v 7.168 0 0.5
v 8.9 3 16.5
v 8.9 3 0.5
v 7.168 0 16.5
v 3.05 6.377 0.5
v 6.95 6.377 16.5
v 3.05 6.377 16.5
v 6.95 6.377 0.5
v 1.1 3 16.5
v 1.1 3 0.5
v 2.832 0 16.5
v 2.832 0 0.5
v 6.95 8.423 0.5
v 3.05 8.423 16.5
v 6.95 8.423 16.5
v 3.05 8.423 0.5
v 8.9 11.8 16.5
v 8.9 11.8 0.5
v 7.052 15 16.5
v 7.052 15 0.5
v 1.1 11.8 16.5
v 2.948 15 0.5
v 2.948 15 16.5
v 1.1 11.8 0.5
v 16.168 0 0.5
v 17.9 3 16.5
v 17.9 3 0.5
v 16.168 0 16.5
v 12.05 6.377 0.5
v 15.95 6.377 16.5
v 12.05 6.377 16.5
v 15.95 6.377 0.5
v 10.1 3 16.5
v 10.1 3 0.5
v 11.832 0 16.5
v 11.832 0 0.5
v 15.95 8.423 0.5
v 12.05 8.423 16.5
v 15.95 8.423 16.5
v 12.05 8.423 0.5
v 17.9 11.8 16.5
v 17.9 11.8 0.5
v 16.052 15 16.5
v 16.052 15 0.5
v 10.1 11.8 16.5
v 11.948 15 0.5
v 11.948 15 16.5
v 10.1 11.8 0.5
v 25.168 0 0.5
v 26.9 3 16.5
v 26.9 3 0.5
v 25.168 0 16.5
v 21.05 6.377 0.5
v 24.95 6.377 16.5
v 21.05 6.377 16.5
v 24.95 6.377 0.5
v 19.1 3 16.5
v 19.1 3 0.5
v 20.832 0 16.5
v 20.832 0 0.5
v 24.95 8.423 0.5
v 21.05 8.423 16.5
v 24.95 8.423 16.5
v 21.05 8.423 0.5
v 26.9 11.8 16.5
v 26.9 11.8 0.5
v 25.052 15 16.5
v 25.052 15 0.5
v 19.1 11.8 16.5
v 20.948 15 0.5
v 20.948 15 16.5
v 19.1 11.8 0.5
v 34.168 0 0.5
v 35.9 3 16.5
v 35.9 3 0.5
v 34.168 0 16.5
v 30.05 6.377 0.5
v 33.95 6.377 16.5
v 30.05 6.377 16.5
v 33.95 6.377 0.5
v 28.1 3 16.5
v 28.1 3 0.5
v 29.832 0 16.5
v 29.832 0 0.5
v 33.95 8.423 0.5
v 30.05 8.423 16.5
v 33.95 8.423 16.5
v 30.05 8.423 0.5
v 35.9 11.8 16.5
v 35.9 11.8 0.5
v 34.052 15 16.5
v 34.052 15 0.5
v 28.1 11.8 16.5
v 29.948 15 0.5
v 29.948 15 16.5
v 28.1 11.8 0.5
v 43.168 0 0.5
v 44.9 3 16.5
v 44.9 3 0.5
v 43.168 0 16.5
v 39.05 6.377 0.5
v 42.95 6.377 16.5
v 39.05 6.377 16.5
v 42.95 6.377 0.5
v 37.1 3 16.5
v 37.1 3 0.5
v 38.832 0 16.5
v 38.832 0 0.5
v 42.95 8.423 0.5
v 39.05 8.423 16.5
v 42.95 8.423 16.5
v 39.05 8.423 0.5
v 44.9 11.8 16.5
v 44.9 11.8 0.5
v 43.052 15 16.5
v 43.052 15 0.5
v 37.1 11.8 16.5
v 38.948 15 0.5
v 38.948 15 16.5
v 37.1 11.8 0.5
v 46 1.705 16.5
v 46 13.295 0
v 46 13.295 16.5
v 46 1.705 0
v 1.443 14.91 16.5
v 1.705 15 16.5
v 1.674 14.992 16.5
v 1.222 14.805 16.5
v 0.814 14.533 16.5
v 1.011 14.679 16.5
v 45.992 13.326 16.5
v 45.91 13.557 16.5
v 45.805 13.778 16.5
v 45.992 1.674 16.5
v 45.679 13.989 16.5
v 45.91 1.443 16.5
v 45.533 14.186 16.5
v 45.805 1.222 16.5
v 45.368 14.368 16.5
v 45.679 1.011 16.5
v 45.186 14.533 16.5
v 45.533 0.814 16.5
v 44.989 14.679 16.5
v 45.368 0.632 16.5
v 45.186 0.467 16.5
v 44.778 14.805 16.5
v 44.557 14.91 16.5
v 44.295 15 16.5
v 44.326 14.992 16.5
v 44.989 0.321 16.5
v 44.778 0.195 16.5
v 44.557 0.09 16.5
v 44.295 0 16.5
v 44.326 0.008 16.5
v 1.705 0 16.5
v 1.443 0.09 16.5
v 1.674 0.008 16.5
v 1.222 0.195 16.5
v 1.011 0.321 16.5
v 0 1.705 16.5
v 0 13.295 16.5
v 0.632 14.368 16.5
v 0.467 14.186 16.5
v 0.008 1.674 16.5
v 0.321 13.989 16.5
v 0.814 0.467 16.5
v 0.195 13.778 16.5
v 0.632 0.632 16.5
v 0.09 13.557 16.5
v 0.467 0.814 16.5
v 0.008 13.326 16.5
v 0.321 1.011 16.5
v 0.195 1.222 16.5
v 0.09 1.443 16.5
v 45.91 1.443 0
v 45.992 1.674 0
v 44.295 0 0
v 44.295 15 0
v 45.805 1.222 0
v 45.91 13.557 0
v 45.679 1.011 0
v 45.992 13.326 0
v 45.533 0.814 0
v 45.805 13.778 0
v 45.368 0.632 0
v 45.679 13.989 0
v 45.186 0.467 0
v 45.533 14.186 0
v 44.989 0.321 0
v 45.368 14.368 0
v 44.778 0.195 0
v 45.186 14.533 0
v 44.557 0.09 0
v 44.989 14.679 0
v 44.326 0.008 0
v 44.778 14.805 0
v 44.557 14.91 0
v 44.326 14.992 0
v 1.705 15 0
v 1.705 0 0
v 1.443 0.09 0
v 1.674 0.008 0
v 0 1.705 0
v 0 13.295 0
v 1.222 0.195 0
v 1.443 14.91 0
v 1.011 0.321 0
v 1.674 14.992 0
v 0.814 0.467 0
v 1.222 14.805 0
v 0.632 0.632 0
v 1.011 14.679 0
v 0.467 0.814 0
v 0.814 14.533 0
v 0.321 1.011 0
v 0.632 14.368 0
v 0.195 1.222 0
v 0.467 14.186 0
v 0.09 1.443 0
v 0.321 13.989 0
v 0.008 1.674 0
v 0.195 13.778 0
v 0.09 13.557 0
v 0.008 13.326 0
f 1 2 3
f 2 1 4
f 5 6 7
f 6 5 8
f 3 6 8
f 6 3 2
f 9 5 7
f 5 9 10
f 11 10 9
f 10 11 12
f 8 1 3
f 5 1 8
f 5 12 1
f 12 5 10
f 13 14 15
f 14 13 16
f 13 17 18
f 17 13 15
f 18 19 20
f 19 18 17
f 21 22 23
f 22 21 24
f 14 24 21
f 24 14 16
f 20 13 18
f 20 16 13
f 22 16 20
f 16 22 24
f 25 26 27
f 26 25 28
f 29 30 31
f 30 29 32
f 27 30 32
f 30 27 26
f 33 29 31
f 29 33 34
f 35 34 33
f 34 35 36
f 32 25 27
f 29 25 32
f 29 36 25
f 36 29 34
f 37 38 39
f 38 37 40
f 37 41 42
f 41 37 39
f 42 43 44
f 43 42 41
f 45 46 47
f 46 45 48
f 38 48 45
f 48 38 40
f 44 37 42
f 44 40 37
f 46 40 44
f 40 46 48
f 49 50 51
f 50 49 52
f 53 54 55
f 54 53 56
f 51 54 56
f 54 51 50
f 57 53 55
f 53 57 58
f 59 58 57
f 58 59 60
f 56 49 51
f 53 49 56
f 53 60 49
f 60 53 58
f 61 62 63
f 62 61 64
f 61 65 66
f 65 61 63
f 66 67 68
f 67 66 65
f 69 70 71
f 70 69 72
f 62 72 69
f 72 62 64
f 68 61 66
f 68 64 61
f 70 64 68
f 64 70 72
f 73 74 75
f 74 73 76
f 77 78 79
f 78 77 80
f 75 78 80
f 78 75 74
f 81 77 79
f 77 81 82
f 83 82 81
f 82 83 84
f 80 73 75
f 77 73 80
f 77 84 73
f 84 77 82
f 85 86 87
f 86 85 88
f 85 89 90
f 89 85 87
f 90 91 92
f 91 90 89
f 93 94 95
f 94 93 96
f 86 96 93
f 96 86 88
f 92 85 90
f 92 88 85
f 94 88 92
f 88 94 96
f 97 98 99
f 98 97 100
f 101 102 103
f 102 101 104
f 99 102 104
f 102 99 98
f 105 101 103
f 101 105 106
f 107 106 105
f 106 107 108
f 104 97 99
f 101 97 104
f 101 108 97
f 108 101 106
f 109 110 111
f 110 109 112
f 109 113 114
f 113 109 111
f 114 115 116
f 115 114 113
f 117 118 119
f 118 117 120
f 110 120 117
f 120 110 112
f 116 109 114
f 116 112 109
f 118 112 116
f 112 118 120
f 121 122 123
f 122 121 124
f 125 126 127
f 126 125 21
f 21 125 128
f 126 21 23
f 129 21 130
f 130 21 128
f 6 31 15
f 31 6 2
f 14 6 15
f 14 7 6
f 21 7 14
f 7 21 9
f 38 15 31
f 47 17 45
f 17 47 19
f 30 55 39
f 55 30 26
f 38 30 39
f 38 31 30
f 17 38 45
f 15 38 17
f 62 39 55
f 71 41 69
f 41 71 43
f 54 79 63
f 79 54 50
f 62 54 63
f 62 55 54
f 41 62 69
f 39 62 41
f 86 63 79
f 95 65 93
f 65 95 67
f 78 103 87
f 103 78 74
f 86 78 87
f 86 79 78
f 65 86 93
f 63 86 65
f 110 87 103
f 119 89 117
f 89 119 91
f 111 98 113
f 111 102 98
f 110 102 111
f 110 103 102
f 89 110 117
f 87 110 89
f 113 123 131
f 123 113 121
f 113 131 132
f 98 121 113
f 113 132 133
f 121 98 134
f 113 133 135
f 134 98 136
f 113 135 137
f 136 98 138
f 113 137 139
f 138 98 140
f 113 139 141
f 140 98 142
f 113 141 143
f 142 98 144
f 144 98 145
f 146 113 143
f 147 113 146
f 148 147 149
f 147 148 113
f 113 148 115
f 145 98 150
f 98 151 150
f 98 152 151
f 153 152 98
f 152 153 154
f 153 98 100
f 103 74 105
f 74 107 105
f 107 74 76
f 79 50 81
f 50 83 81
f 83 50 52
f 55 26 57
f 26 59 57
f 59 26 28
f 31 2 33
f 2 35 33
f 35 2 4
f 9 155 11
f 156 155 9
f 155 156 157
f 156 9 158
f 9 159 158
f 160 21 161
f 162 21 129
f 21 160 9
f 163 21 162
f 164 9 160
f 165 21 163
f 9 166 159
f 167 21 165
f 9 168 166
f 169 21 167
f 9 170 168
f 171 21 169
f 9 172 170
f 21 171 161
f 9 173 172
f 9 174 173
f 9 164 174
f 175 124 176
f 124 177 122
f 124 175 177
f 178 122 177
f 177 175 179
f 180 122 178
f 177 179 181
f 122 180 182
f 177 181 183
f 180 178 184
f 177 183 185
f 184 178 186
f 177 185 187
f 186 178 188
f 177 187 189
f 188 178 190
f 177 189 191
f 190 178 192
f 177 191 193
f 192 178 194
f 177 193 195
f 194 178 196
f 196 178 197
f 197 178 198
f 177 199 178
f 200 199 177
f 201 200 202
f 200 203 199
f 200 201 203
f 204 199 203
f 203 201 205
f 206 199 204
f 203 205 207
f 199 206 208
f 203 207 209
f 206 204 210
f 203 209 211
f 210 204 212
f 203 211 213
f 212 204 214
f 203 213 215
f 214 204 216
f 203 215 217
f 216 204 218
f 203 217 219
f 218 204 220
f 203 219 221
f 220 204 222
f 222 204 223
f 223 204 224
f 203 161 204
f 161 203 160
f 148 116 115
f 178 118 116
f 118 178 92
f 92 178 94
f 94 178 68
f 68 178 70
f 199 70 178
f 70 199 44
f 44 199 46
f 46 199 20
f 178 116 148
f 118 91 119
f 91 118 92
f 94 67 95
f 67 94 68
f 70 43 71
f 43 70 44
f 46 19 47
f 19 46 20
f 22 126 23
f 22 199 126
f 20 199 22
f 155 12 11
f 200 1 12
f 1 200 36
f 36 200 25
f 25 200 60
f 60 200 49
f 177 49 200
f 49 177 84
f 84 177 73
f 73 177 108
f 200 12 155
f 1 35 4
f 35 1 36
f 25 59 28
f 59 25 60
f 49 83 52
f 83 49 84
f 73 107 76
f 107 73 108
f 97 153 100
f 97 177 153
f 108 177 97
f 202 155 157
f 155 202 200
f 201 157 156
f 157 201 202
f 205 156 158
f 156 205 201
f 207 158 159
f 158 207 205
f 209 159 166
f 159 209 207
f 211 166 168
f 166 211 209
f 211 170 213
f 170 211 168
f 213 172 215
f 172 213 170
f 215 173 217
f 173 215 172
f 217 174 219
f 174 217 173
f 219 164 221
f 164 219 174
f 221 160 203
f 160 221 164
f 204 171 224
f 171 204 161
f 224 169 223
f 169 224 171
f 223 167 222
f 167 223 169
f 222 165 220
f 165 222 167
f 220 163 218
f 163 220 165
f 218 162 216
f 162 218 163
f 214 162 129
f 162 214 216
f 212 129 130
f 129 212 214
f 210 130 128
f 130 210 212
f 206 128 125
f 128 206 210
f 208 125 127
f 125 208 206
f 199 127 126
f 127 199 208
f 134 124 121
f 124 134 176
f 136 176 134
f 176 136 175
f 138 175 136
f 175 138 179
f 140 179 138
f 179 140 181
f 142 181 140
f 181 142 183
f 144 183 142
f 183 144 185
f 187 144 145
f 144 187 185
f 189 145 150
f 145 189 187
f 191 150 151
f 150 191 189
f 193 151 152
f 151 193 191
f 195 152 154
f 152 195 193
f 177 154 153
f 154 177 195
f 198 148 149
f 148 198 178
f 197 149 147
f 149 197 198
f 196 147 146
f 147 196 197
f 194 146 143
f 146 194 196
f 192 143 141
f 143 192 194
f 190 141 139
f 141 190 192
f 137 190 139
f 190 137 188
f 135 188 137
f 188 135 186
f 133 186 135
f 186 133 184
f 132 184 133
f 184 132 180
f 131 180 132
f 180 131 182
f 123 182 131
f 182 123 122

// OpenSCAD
// file: fillets.scad
// 2d primitive for outside fillets.
module fil_2d_o(r, angle=90) {
  intersection() {
    circle(r=r);
    polygon([
      [0, 0],
      [0, r],
      [r * tan(angle/2), r],
      [r * sin(angle), r * cos(angle)]
    ]);
  }
}

// 2d primitive for inside fillets.
module fil_2d_i(r, angle=90) {
  translate([r, r, 0])
  difference() {
    polygon([
      [0, 0],
      [0, -r],
      [-r * tan(angle/2), -r],
      [-r * sin(angle), -r * cos(angle)]
    ]);
    circle(r=r);
  }
}

// 3d polar outside fillet.
module fil_polar_o(R, r, angle=90) {
  rotate_extrude(convexity=10) {
    translate([R, 0, 0]) {
      fil_2d_o(r, angle);
    }
  }
}

// 3d polar inside fillet.
module fil_polar_i(R, r, angle=90) {
  rotate_extrude(convexity=10) {
    translate([R, 0, 0]) {
      fil_2d_i(r, angle);
    }
  }
}

// 3d linear outside fillet.
module fil_linear_o(l, r, angle=90) {
  rotate([0, -90, 180]) {
    linear_extrude(height=l, center=false) {
      fil_2d_o(r, angle);
    }
  }
}

// 3d linear inside fillet.
module fil_linear_i(l, r, angle=90) {
  rotate([0, -90, 180]) {
    linear_extrude(height=l, center=false) {
      fil_2d_i(r, angle);
    }
  }
}
// main file
/**
 * Remix of hex bit holder by TBRIshtar on Thingiverse:
 * http://www.thingiverse.com/thing:241501
 *
 * This remix mimics the original as close as possible but has the following
 * features:
 *  - Any number of rows and columns, still keeping the edge rows open on the
 *    sides. This is nice if the hex shank has the bit size stamped on it.
 *  - Footer height can be adjusted
 *  - Height can be adjusted
 *  - Allows easy scaling in the X and Y directions if your printer causes
 *    the hex holes to be too tight, like mine does.
 *
 * Author: Fitzterra <fitz_subs@icave.net>  - July 2016
 *
 * License:
 * This work is licensed under the Creative Commons Attribution-ShareAlike 3.0
 * Unported License. To view a copy of this license, visit
 * http://creativecommons.org/licenses/by-sa/3.0/ or send a letter to Creative
 * Commons, PO Box 1866, Mountain View, CA 94042, USA.
 **/

// Fillets library from:
// https://github.com/jfhbrook/openscad-fillets/blob/master/fillets.scad
// Thanks jfhbrook!
use <fillets.scad>;

// Number of rows
rows = 2;
// Number of columns
columns = 5;
// Height of the footer
foot = 0.5;
// Height above footer
height = 16;
// Scaling for print tolerances (only X/Y, not Z)
scl = 1.00; //[0.90:0.01:1.20]


/**
 * Module to generate the hex bit holder
 *
 * Note that this module tries to mimic the original as close as possible and
 * is the reason why the math looks a bit convoluted :-)
 *
 * @param x: num columns
 * @param y: num rows
 * @param f: footer height
 * @param h: height above footer
 **/
module Holder(x=columns, y=rows, f=foot, h=height, s=scl) {
    // Nicely rounded fillets
    $fn=64;

    // Calculate the total width and depth
    w = x*9+1;
    d = y*8.8-2.6;

    // Apply a scaling if needed
    scale([s, s, 1])
        difference() {
            // The main block
            cube([w, d, f+h]);
            // Sink the hex holes
            for(xl=[0:x-1])
                for(yl=[0:y-1])
                    translate([xl*9+5, yl*8.8+3.0, f])
                        cylinder(d=7.8, h=h+1, $fn=6);

            // Fillet the 4 corners
            translate([-0.1, -0.1, -1])
                rotate([0, -90, 180])
                    fil_linear_i(f+h+2, 2.5);
            translate([-0.1, d+0.1, -1])
                rotate([0, -90, 90])
                    fil_linear_i(f+h+2, 2.5);
            translate([w+0.1, -0.1, -1])
                rotate([0, -90, -90])
                    fil_linear_i(f+h+2, 2.5);
            translate([w+0.1, d+0.1, -1])
                rotate([0, -90, 0])
                    fil_linear_i(f+h+2, 2.5);
        }
}


Holder();
